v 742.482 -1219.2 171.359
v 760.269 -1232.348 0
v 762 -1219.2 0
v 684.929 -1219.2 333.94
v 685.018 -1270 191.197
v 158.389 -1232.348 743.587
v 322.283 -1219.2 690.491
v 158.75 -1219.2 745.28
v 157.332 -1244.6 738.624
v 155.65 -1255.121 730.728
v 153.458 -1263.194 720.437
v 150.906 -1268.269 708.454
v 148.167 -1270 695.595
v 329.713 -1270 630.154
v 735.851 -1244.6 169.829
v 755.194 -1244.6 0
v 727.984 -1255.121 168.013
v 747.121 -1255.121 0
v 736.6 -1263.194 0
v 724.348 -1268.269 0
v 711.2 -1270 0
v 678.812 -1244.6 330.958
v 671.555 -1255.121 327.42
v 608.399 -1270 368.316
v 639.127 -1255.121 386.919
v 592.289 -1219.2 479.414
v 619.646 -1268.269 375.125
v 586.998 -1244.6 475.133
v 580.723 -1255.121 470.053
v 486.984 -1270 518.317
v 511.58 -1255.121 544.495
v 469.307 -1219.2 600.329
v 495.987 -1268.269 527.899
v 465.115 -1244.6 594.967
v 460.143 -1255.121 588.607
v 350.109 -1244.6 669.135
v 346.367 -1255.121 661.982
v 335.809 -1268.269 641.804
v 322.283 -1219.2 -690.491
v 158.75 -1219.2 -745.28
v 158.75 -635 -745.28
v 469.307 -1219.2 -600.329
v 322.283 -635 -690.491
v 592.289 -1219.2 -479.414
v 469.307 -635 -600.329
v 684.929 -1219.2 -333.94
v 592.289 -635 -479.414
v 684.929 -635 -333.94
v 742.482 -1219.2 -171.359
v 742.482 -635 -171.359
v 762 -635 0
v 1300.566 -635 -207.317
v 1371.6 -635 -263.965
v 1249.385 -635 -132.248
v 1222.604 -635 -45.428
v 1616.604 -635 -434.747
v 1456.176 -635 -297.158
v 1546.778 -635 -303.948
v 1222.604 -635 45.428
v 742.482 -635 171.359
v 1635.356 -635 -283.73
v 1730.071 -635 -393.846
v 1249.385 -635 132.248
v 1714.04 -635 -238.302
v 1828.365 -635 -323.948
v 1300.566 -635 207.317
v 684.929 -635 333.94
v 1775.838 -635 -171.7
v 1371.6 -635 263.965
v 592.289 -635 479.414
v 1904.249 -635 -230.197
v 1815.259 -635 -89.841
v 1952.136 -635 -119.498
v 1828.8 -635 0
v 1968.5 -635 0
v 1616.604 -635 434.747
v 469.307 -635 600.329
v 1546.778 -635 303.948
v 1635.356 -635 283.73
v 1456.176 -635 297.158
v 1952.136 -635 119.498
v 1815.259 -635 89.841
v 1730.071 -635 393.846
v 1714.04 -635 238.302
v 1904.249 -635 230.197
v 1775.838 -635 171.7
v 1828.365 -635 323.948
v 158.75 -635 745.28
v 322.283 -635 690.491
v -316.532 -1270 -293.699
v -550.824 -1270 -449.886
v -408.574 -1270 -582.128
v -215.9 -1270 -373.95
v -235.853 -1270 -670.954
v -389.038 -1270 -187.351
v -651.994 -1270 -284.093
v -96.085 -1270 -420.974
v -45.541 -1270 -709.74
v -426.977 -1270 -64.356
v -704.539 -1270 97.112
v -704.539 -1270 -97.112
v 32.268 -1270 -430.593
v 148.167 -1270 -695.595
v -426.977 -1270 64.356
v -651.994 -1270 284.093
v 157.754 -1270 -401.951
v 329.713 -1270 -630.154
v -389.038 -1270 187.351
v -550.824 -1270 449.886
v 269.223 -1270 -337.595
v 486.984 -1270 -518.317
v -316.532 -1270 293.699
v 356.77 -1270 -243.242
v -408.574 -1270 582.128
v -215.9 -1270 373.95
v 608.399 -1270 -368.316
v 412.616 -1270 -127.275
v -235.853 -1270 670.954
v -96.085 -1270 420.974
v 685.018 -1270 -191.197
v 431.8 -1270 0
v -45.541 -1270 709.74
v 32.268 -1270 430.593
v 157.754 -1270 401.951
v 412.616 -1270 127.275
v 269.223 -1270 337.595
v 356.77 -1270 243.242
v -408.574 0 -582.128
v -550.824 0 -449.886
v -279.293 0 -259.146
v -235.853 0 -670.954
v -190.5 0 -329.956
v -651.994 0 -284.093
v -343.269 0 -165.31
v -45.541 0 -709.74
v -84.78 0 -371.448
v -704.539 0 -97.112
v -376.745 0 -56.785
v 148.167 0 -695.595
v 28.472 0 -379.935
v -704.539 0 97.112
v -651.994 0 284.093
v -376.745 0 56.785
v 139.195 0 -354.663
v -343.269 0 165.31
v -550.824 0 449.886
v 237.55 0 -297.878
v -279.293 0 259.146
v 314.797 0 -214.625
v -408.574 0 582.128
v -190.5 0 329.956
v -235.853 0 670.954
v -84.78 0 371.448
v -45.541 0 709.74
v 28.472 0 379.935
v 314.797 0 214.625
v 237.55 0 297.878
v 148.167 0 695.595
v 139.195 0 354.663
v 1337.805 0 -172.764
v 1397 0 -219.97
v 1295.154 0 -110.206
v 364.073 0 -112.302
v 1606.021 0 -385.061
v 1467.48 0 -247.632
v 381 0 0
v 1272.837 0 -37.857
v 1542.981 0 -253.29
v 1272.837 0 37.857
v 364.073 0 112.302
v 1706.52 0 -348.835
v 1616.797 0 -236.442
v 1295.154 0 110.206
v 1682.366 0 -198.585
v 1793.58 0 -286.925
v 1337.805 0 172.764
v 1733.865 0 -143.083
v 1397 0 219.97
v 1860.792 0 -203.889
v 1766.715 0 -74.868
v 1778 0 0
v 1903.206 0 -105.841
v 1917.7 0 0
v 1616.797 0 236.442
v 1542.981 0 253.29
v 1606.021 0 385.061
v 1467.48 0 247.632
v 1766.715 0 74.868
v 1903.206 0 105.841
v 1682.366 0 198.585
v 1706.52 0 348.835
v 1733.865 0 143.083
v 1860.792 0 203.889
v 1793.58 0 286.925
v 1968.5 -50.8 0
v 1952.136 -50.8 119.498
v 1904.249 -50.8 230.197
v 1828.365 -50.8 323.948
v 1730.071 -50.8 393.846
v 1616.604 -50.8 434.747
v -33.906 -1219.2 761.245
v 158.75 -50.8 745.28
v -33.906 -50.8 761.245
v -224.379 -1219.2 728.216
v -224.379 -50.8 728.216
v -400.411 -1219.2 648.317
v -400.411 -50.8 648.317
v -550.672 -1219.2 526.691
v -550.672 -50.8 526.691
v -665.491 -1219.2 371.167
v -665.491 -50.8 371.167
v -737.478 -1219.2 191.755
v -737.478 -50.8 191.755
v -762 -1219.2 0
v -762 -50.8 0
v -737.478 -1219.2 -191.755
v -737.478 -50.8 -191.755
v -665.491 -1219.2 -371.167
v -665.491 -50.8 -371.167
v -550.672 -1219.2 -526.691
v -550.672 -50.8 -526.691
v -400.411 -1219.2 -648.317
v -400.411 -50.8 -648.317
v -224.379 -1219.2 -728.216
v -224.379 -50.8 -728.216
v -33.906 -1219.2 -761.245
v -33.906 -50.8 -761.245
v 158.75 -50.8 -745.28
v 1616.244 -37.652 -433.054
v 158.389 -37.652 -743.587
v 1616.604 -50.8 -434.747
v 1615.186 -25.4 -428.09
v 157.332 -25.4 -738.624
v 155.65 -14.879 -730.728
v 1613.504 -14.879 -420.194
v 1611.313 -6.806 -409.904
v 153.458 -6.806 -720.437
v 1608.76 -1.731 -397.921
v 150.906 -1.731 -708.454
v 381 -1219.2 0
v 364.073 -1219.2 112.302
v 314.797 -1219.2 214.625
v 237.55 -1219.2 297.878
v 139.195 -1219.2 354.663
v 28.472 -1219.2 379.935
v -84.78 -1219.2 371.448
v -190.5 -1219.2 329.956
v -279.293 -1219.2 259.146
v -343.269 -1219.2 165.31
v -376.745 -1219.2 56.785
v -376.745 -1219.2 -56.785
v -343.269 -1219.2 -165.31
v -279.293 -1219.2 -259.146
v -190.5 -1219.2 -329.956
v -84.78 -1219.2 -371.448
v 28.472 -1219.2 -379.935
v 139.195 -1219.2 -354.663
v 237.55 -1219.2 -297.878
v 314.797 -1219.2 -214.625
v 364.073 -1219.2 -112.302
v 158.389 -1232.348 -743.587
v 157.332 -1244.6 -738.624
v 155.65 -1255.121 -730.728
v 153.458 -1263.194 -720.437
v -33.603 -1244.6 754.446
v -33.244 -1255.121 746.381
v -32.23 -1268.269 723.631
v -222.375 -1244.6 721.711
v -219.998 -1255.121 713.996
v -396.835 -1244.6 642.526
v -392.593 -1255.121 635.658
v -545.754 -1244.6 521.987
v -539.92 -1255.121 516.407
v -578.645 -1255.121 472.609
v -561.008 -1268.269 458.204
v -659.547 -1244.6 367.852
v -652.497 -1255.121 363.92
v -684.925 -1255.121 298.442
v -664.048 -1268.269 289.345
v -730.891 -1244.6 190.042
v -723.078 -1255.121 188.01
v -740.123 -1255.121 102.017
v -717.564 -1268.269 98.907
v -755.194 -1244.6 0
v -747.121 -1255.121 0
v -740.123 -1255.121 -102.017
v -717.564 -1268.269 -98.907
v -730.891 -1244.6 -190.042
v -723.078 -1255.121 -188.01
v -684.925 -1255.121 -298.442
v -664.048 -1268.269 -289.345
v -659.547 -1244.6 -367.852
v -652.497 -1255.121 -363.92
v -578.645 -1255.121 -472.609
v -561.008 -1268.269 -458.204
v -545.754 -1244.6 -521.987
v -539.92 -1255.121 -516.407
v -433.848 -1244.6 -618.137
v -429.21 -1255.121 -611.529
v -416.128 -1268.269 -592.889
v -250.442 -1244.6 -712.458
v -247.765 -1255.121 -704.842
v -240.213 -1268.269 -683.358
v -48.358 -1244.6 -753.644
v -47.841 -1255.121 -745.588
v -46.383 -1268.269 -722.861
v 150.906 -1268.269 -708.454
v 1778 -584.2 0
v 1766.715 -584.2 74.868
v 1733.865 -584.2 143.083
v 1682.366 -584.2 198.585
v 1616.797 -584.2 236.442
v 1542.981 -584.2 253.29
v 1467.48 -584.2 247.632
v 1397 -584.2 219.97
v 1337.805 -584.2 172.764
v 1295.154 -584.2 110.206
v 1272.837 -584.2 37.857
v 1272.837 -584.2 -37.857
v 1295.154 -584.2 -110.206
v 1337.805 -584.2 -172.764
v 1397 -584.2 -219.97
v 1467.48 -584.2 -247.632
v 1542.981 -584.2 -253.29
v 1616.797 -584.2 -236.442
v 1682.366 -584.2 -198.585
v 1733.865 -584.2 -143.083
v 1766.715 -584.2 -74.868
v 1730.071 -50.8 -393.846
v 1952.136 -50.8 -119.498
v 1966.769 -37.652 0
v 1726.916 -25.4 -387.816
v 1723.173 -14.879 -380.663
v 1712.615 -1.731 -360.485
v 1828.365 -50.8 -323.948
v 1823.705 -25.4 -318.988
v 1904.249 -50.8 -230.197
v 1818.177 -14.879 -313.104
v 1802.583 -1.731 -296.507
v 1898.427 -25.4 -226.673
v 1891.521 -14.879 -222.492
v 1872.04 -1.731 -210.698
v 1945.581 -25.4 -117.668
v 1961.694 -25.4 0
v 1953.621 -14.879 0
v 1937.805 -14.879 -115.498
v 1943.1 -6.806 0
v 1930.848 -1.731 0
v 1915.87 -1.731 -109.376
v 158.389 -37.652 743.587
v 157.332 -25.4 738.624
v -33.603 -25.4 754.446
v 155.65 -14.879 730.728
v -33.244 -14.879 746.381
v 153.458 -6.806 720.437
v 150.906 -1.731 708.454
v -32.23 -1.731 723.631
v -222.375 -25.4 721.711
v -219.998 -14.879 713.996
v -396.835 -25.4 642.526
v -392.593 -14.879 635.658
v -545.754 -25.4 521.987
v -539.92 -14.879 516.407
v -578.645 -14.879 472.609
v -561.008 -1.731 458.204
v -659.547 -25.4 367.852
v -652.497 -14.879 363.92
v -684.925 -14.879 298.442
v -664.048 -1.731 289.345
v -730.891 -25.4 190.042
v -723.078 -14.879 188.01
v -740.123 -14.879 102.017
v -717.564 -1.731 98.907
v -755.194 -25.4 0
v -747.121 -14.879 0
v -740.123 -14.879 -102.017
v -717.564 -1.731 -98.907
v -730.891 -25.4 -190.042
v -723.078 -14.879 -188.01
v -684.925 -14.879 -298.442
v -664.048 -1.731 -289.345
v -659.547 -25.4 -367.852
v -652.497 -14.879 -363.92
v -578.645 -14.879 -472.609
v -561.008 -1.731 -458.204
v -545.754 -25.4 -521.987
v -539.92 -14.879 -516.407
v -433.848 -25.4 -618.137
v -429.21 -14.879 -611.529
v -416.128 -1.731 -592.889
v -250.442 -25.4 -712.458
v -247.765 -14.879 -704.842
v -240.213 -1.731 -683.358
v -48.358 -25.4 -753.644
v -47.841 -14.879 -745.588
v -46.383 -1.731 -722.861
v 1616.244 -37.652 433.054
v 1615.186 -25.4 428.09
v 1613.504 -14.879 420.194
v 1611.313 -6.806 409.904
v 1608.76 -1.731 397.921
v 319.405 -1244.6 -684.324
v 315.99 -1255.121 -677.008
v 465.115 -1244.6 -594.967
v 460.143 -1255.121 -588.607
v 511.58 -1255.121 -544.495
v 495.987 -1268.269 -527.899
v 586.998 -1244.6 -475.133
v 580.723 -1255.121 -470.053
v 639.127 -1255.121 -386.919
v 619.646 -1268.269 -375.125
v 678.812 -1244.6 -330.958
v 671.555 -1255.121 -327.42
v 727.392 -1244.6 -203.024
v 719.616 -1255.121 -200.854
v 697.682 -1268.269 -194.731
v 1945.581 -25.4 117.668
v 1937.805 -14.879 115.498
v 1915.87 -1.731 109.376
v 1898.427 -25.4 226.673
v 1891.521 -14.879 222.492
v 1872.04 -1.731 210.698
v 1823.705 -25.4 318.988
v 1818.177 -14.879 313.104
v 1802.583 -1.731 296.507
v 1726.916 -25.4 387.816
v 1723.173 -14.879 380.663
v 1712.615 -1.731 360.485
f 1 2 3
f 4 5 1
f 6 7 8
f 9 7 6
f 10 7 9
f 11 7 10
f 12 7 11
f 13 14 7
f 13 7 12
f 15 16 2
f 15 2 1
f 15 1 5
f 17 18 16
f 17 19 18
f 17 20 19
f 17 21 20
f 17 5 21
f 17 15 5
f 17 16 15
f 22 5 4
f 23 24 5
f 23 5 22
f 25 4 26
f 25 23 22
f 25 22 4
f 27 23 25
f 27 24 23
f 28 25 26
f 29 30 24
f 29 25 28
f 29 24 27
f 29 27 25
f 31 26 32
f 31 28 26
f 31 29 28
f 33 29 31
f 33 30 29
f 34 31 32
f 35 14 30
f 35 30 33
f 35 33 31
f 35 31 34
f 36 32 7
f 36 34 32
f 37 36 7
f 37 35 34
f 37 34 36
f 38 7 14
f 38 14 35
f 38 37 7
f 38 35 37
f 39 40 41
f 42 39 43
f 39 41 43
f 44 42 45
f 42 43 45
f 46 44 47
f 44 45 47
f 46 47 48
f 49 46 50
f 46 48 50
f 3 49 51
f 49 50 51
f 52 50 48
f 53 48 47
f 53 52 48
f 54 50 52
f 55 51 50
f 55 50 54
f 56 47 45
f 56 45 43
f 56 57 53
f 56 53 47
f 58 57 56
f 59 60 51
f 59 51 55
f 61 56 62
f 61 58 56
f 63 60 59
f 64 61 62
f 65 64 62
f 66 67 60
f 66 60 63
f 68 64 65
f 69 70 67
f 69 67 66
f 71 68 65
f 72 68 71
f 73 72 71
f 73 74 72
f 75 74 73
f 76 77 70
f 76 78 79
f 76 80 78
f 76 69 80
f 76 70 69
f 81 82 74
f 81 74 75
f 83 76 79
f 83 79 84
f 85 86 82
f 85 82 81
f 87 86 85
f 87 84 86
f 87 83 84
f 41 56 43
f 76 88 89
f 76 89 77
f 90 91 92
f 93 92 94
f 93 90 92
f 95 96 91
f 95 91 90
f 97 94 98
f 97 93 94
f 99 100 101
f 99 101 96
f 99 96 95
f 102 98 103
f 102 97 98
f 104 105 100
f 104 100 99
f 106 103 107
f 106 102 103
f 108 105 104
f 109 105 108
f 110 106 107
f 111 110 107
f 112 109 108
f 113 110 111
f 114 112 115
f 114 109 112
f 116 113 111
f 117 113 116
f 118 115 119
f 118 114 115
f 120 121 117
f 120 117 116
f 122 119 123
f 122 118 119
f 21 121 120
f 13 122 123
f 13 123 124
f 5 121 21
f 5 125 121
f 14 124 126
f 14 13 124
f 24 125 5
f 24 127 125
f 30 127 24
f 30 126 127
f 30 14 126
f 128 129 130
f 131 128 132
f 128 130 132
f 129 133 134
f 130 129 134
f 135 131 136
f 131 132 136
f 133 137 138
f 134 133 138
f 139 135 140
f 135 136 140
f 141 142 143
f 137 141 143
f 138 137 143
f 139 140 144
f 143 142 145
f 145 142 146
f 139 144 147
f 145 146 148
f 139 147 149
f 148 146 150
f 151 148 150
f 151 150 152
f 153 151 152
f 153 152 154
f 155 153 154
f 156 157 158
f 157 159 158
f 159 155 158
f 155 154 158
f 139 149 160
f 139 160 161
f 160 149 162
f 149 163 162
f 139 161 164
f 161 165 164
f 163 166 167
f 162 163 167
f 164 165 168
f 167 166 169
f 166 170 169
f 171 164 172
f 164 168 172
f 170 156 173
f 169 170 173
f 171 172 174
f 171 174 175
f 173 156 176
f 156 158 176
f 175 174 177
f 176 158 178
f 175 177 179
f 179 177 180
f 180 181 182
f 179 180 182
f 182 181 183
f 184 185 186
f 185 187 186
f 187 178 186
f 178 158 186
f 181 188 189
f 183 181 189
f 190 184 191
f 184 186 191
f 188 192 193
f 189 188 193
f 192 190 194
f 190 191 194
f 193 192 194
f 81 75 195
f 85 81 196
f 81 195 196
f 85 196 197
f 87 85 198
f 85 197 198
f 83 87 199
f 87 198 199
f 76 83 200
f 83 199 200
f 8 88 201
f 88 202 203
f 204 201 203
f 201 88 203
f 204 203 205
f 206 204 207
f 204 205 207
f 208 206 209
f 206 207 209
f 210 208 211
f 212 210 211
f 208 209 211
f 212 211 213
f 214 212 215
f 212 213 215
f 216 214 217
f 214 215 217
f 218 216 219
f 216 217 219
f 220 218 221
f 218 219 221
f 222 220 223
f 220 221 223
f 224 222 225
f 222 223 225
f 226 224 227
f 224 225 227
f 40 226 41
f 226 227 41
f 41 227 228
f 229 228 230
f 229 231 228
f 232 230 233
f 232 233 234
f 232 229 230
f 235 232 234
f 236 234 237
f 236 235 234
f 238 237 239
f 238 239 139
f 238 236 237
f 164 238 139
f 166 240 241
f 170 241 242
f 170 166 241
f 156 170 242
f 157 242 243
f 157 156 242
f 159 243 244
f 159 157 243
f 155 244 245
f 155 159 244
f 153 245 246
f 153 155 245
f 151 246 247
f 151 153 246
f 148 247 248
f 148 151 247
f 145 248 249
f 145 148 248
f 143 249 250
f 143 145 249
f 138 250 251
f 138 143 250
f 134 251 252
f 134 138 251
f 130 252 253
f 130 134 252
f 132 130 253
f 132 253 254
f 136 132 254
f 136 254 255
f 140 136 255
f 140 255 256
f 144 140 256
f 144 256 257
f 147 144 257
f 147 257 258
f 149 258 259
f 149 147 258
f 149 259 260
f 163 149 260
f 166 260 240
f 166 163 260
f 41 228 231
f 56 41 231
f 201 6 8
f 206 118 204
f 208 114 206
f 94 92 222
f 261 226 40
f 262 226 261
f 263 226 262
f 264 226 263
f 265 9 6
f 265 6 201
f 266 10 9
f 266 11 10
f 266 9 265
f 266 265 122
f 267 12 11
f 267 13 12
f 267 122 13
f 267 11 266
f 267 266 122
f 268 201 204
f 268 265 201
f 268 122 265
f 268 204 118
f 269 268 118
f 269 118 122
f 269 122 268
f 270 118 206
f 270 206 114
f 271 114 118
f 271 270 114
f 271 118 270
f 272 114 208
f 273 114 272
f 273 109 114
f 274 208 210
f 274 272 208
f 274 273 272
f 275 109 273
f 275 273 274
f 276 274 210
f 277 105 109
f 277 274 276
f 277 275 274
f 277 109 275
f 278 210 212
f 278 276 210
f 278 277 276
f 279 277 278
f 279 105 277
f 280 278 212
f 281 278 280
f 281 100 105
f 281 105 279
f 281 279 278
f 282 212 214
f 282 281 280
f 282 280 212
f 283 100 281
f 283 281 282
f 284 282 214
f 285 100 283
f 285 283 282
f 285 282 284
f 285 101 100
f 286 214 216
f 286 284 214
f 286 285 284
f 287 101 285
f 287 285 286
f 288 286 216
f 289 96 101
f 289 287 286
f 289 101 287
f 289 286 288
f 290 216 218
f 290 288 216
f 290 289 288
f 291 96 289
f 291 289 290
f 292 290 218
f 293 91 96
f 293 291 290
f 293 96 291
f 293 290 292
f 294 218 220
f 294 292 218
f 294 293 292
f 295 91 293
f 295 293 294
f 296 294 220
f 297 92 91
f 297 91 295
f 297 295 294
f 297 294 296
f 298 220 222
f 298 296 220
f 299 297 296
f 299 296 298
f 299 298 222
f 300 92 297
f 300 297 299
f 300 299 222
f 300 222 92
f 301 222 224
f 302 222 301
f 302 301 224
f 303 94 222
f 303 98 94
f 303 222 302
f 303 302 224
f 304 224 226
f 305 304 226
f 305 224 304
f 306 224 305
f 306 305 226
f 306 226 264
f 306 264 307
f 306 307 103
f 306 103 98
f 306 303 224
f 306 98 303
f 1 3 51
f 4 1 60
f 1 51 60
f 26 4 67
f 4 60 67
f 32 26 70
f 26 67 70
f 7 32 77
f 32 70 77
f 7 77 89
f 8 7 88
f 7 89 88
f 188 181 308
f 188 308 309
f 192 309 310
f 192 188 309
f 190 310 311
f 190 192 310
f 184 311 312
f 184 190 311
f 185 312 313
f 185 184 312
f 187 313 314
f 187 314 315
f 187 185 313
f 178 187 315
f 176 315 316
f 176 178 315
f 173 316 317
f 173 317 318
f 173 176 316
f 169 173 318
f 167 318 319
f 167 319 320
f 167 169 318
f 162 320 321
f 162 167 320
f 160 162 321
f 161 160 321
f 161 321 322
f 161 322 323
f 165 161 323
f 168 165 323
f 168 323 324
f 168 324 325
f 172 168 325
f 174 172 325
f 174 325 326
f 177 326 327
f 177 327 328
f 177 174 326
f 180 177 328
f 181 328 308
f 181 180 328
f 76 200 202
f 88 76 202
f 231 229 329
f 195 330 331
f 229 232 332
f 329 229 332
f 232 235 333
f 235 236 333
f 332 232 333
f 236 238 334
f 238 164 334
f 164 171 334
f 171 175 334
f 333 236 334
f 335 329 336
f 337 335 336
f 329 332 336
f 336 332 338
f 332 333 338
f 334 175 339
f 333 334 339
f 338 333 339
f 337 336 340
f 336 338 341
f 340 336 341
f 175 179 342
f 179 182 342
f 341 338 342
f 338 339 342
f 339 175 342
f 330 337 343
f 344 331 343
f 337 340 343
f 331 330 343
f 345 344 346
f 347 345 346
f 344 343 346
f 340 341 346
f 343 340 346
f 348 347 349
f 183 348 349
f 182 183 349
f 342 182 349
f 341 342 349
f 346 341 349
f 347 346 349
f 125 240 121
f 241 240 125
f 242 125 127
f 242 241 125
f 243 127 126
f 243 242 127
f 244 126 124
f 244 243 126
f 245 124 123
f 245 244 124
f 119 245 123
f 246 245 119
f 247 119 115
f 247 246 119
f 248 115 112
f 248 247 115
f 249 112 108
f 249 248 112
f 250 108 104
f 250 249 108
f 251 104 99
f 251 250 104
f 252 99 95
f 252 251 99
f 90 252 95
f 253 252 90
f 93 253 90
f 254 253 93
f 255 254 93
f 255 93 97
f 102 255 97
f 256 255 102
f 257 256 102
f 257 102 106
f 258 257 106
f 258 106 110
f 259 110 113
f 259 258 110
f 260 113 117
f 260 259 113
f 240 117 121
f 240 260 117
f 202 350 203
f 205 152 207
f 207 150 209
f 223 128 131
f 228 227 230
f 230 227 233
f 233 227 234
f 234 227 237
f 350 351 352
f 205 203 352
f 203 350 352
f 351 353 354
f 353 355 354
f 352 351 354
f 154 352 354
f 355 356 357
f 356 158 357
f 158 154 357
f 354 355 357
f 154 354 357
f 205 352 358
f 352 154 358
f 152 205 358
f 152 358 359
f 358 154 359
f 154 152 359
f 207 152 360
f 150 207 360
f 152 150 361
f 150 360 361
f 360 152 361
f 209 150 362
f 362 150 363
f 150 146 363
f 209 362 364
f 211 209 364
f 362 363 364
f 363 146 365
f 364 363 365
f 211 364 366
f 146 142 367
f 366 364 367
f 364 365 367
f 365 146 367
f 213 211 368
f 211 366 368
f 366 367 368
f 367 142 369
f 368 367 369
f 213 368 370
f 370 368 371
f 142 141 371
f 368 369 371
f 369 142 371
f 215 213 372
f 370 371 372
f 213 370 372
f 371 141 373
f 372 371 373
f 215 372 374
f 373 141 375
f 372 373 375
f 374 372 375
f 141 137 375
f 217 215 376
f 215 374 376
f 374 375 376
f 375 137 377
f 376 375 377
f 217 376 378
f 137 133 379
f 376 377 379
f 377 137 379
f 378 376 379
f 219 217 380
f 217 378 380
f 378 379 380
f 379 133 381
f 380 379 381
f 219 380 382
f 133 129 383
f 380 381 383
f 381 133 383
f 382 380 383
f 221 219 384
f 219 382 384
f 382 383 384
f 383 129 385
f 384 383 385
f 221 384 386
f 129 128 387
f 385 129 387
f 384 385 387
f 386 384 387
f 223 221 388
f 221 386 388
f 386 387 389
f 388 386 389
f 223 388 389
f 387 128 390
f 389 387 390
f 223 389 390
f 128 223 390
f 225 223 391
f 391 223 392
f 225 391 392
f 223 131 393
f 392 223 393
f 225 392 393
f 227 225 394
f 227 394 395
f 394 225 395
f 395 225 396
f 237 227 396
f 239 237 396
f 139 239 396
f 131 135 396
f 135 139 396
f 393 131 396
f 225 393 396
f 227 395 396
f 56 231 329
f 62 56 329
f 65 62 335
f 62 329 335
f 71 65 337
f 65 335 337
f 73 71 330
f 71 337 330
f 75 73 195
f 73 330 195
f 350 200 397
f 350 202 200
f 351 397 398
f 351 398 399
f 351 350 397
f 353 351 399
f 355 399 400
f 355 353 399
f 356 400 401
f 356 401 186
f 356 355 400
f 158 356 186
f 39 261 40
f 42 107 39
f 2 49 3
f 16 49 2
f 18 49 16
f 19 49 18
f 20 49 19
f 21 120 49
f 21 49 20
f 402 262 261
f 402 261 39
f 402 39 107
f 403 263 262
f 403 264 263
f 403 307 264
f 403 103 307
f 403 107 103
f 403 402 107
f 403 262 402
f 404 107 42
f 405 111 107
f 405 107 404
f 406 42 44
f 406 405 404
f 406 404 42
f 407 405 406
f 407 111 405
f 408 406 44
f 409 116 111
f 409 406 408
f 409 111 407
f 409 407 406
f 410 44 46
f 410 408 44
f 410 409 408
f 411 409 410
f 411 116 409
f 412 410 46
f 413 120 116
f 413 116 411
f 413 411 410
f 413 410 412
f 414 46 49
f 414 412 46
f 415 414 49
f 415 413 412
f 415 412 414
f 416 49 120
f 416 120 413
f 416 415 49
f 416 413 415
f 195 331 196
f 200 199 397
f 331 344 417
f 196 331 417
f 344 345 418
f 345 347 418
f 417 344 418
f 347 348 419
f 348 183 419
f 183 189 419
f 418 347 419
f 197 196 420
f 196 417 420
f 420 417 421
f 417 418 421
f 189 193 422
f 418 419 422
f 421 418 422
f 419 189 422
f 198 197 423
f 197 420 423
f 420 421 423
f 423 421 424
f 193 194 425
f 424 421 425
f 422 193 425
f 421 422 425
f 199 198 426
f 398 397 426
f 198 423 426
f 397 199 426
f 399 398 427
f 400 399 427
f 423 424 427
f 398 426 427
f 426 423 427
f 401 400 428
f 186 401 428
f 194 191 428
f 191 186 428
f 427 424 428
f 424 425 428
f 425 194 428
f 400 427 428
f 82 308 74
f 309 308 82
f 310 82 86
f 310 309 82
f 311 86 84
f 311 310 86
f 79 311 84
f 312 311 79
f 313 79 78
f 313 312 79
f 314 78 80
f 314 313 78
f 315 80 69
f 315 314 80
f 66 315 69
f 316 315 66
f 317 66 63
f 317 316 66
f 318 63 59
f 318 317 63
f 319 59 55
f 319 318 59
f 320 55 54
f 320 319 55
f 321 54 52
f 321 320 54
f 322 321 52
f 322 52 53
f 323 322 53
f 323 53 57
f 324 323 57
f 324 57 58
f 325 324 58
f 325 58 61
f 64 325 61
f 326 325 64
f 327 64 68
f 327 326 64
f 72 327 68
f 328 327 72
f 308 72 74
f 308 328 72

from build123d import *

# Parameters (mm, degrees)
F0_R     = 381
F0_R_2   = 254
F1_DEPTH = 635
F2_DEPTH = 1270
F3_R     = 50.8
F4_SIZE  = 50.8


with BuildPart() as f1:
    # F0 (on Front) → F1 (new body)
    with BuildSketch(Plane.XZ):
        with BuildLine():
            ThreePointArc((158.75, 745.280107), (592.28857, 479.414487), (762, 0))
            ThreePointArc((762, 0), (592.28857, -479.414487), (158.75, -745.280107))
            Line((158.75, -745.280107), (1616.604167, -434.746729))
            ThreePointArc((1616.604167, -434.746729), (1079.5, 0), (1616.604167, 434.746729))
            Line((1616.604167, 434.746729), (158.75, 745.280107))
        make_face()
        with BuildLine():
            ThreePointArc((158.75, -745.280107), (592.28857, -479.414487), (762, 0))
            ThreePointArc((762, 0), (592.28857, 479.414487), (158.75, 745.280107))
            ThreePointArc((158.75, 745.280107), (-762, 0), (158.75, -745.280107))
        make_face()
        Circle(F0_R, mode=Mode.SUBTRACT)
        with BuildLine():
            ThreePointArc((1968.5, 0), (1869.501666, 279.658451), (1616.604167, 434.746729))
            ThreePointArc((1616.604167, 434.746729), (1079.5, 0), (1616.604167, -434.746729))
            ThreePointArc((1616.604167, -434.746729), (1869.501666, -279.658451), (1968.5, 0))
        make_face()
        with Locations((1524, 0)):
            Circle(F0_R_2, mode=Mode.SUBTRACT)
    extrude(amount=F1_DEPTH)

    # F0 (on Front) → F2 (join)
    with BuildSketch(Plane.XZ):
        with BuildLine():
            ThreePointArc((158.75, -745.280107), (592.28857, -479.414487), (762, 0))
            ThreePointArc((762, 0), (592.28857, 479.414487), (158.75, 745.280107))
            ThreePointArc((158.75, 745.280107), (-762, 0), (158.75, -745.280107))
        make_face()
        Circle(F0_R, mode=Mode.SUBTRACT)
    extrude(amount=F2_DEPTH)

    # F3
    f3_edges = [f1.edges().sort_by_distance(p)[0] for p in [
        (-158.75, -1270, 745.280107),
        (-762, 0, 0),
        (887.677083, 0, 590.013418),
        (1968.5, 0, 0),
        (887.677083, 0, -590.013418),
    ]]
    fillet(f3_edges, radius=F3_R)

    # F4
    f4_edges = [f1.edges().sort_by_distance(p)[0] for p in [
        (-381, -1270, 0),
        (1270, -635, 0),
    ]]
    chamfer(f4_edges, length=F4_SIZE)


solid = f1.part
